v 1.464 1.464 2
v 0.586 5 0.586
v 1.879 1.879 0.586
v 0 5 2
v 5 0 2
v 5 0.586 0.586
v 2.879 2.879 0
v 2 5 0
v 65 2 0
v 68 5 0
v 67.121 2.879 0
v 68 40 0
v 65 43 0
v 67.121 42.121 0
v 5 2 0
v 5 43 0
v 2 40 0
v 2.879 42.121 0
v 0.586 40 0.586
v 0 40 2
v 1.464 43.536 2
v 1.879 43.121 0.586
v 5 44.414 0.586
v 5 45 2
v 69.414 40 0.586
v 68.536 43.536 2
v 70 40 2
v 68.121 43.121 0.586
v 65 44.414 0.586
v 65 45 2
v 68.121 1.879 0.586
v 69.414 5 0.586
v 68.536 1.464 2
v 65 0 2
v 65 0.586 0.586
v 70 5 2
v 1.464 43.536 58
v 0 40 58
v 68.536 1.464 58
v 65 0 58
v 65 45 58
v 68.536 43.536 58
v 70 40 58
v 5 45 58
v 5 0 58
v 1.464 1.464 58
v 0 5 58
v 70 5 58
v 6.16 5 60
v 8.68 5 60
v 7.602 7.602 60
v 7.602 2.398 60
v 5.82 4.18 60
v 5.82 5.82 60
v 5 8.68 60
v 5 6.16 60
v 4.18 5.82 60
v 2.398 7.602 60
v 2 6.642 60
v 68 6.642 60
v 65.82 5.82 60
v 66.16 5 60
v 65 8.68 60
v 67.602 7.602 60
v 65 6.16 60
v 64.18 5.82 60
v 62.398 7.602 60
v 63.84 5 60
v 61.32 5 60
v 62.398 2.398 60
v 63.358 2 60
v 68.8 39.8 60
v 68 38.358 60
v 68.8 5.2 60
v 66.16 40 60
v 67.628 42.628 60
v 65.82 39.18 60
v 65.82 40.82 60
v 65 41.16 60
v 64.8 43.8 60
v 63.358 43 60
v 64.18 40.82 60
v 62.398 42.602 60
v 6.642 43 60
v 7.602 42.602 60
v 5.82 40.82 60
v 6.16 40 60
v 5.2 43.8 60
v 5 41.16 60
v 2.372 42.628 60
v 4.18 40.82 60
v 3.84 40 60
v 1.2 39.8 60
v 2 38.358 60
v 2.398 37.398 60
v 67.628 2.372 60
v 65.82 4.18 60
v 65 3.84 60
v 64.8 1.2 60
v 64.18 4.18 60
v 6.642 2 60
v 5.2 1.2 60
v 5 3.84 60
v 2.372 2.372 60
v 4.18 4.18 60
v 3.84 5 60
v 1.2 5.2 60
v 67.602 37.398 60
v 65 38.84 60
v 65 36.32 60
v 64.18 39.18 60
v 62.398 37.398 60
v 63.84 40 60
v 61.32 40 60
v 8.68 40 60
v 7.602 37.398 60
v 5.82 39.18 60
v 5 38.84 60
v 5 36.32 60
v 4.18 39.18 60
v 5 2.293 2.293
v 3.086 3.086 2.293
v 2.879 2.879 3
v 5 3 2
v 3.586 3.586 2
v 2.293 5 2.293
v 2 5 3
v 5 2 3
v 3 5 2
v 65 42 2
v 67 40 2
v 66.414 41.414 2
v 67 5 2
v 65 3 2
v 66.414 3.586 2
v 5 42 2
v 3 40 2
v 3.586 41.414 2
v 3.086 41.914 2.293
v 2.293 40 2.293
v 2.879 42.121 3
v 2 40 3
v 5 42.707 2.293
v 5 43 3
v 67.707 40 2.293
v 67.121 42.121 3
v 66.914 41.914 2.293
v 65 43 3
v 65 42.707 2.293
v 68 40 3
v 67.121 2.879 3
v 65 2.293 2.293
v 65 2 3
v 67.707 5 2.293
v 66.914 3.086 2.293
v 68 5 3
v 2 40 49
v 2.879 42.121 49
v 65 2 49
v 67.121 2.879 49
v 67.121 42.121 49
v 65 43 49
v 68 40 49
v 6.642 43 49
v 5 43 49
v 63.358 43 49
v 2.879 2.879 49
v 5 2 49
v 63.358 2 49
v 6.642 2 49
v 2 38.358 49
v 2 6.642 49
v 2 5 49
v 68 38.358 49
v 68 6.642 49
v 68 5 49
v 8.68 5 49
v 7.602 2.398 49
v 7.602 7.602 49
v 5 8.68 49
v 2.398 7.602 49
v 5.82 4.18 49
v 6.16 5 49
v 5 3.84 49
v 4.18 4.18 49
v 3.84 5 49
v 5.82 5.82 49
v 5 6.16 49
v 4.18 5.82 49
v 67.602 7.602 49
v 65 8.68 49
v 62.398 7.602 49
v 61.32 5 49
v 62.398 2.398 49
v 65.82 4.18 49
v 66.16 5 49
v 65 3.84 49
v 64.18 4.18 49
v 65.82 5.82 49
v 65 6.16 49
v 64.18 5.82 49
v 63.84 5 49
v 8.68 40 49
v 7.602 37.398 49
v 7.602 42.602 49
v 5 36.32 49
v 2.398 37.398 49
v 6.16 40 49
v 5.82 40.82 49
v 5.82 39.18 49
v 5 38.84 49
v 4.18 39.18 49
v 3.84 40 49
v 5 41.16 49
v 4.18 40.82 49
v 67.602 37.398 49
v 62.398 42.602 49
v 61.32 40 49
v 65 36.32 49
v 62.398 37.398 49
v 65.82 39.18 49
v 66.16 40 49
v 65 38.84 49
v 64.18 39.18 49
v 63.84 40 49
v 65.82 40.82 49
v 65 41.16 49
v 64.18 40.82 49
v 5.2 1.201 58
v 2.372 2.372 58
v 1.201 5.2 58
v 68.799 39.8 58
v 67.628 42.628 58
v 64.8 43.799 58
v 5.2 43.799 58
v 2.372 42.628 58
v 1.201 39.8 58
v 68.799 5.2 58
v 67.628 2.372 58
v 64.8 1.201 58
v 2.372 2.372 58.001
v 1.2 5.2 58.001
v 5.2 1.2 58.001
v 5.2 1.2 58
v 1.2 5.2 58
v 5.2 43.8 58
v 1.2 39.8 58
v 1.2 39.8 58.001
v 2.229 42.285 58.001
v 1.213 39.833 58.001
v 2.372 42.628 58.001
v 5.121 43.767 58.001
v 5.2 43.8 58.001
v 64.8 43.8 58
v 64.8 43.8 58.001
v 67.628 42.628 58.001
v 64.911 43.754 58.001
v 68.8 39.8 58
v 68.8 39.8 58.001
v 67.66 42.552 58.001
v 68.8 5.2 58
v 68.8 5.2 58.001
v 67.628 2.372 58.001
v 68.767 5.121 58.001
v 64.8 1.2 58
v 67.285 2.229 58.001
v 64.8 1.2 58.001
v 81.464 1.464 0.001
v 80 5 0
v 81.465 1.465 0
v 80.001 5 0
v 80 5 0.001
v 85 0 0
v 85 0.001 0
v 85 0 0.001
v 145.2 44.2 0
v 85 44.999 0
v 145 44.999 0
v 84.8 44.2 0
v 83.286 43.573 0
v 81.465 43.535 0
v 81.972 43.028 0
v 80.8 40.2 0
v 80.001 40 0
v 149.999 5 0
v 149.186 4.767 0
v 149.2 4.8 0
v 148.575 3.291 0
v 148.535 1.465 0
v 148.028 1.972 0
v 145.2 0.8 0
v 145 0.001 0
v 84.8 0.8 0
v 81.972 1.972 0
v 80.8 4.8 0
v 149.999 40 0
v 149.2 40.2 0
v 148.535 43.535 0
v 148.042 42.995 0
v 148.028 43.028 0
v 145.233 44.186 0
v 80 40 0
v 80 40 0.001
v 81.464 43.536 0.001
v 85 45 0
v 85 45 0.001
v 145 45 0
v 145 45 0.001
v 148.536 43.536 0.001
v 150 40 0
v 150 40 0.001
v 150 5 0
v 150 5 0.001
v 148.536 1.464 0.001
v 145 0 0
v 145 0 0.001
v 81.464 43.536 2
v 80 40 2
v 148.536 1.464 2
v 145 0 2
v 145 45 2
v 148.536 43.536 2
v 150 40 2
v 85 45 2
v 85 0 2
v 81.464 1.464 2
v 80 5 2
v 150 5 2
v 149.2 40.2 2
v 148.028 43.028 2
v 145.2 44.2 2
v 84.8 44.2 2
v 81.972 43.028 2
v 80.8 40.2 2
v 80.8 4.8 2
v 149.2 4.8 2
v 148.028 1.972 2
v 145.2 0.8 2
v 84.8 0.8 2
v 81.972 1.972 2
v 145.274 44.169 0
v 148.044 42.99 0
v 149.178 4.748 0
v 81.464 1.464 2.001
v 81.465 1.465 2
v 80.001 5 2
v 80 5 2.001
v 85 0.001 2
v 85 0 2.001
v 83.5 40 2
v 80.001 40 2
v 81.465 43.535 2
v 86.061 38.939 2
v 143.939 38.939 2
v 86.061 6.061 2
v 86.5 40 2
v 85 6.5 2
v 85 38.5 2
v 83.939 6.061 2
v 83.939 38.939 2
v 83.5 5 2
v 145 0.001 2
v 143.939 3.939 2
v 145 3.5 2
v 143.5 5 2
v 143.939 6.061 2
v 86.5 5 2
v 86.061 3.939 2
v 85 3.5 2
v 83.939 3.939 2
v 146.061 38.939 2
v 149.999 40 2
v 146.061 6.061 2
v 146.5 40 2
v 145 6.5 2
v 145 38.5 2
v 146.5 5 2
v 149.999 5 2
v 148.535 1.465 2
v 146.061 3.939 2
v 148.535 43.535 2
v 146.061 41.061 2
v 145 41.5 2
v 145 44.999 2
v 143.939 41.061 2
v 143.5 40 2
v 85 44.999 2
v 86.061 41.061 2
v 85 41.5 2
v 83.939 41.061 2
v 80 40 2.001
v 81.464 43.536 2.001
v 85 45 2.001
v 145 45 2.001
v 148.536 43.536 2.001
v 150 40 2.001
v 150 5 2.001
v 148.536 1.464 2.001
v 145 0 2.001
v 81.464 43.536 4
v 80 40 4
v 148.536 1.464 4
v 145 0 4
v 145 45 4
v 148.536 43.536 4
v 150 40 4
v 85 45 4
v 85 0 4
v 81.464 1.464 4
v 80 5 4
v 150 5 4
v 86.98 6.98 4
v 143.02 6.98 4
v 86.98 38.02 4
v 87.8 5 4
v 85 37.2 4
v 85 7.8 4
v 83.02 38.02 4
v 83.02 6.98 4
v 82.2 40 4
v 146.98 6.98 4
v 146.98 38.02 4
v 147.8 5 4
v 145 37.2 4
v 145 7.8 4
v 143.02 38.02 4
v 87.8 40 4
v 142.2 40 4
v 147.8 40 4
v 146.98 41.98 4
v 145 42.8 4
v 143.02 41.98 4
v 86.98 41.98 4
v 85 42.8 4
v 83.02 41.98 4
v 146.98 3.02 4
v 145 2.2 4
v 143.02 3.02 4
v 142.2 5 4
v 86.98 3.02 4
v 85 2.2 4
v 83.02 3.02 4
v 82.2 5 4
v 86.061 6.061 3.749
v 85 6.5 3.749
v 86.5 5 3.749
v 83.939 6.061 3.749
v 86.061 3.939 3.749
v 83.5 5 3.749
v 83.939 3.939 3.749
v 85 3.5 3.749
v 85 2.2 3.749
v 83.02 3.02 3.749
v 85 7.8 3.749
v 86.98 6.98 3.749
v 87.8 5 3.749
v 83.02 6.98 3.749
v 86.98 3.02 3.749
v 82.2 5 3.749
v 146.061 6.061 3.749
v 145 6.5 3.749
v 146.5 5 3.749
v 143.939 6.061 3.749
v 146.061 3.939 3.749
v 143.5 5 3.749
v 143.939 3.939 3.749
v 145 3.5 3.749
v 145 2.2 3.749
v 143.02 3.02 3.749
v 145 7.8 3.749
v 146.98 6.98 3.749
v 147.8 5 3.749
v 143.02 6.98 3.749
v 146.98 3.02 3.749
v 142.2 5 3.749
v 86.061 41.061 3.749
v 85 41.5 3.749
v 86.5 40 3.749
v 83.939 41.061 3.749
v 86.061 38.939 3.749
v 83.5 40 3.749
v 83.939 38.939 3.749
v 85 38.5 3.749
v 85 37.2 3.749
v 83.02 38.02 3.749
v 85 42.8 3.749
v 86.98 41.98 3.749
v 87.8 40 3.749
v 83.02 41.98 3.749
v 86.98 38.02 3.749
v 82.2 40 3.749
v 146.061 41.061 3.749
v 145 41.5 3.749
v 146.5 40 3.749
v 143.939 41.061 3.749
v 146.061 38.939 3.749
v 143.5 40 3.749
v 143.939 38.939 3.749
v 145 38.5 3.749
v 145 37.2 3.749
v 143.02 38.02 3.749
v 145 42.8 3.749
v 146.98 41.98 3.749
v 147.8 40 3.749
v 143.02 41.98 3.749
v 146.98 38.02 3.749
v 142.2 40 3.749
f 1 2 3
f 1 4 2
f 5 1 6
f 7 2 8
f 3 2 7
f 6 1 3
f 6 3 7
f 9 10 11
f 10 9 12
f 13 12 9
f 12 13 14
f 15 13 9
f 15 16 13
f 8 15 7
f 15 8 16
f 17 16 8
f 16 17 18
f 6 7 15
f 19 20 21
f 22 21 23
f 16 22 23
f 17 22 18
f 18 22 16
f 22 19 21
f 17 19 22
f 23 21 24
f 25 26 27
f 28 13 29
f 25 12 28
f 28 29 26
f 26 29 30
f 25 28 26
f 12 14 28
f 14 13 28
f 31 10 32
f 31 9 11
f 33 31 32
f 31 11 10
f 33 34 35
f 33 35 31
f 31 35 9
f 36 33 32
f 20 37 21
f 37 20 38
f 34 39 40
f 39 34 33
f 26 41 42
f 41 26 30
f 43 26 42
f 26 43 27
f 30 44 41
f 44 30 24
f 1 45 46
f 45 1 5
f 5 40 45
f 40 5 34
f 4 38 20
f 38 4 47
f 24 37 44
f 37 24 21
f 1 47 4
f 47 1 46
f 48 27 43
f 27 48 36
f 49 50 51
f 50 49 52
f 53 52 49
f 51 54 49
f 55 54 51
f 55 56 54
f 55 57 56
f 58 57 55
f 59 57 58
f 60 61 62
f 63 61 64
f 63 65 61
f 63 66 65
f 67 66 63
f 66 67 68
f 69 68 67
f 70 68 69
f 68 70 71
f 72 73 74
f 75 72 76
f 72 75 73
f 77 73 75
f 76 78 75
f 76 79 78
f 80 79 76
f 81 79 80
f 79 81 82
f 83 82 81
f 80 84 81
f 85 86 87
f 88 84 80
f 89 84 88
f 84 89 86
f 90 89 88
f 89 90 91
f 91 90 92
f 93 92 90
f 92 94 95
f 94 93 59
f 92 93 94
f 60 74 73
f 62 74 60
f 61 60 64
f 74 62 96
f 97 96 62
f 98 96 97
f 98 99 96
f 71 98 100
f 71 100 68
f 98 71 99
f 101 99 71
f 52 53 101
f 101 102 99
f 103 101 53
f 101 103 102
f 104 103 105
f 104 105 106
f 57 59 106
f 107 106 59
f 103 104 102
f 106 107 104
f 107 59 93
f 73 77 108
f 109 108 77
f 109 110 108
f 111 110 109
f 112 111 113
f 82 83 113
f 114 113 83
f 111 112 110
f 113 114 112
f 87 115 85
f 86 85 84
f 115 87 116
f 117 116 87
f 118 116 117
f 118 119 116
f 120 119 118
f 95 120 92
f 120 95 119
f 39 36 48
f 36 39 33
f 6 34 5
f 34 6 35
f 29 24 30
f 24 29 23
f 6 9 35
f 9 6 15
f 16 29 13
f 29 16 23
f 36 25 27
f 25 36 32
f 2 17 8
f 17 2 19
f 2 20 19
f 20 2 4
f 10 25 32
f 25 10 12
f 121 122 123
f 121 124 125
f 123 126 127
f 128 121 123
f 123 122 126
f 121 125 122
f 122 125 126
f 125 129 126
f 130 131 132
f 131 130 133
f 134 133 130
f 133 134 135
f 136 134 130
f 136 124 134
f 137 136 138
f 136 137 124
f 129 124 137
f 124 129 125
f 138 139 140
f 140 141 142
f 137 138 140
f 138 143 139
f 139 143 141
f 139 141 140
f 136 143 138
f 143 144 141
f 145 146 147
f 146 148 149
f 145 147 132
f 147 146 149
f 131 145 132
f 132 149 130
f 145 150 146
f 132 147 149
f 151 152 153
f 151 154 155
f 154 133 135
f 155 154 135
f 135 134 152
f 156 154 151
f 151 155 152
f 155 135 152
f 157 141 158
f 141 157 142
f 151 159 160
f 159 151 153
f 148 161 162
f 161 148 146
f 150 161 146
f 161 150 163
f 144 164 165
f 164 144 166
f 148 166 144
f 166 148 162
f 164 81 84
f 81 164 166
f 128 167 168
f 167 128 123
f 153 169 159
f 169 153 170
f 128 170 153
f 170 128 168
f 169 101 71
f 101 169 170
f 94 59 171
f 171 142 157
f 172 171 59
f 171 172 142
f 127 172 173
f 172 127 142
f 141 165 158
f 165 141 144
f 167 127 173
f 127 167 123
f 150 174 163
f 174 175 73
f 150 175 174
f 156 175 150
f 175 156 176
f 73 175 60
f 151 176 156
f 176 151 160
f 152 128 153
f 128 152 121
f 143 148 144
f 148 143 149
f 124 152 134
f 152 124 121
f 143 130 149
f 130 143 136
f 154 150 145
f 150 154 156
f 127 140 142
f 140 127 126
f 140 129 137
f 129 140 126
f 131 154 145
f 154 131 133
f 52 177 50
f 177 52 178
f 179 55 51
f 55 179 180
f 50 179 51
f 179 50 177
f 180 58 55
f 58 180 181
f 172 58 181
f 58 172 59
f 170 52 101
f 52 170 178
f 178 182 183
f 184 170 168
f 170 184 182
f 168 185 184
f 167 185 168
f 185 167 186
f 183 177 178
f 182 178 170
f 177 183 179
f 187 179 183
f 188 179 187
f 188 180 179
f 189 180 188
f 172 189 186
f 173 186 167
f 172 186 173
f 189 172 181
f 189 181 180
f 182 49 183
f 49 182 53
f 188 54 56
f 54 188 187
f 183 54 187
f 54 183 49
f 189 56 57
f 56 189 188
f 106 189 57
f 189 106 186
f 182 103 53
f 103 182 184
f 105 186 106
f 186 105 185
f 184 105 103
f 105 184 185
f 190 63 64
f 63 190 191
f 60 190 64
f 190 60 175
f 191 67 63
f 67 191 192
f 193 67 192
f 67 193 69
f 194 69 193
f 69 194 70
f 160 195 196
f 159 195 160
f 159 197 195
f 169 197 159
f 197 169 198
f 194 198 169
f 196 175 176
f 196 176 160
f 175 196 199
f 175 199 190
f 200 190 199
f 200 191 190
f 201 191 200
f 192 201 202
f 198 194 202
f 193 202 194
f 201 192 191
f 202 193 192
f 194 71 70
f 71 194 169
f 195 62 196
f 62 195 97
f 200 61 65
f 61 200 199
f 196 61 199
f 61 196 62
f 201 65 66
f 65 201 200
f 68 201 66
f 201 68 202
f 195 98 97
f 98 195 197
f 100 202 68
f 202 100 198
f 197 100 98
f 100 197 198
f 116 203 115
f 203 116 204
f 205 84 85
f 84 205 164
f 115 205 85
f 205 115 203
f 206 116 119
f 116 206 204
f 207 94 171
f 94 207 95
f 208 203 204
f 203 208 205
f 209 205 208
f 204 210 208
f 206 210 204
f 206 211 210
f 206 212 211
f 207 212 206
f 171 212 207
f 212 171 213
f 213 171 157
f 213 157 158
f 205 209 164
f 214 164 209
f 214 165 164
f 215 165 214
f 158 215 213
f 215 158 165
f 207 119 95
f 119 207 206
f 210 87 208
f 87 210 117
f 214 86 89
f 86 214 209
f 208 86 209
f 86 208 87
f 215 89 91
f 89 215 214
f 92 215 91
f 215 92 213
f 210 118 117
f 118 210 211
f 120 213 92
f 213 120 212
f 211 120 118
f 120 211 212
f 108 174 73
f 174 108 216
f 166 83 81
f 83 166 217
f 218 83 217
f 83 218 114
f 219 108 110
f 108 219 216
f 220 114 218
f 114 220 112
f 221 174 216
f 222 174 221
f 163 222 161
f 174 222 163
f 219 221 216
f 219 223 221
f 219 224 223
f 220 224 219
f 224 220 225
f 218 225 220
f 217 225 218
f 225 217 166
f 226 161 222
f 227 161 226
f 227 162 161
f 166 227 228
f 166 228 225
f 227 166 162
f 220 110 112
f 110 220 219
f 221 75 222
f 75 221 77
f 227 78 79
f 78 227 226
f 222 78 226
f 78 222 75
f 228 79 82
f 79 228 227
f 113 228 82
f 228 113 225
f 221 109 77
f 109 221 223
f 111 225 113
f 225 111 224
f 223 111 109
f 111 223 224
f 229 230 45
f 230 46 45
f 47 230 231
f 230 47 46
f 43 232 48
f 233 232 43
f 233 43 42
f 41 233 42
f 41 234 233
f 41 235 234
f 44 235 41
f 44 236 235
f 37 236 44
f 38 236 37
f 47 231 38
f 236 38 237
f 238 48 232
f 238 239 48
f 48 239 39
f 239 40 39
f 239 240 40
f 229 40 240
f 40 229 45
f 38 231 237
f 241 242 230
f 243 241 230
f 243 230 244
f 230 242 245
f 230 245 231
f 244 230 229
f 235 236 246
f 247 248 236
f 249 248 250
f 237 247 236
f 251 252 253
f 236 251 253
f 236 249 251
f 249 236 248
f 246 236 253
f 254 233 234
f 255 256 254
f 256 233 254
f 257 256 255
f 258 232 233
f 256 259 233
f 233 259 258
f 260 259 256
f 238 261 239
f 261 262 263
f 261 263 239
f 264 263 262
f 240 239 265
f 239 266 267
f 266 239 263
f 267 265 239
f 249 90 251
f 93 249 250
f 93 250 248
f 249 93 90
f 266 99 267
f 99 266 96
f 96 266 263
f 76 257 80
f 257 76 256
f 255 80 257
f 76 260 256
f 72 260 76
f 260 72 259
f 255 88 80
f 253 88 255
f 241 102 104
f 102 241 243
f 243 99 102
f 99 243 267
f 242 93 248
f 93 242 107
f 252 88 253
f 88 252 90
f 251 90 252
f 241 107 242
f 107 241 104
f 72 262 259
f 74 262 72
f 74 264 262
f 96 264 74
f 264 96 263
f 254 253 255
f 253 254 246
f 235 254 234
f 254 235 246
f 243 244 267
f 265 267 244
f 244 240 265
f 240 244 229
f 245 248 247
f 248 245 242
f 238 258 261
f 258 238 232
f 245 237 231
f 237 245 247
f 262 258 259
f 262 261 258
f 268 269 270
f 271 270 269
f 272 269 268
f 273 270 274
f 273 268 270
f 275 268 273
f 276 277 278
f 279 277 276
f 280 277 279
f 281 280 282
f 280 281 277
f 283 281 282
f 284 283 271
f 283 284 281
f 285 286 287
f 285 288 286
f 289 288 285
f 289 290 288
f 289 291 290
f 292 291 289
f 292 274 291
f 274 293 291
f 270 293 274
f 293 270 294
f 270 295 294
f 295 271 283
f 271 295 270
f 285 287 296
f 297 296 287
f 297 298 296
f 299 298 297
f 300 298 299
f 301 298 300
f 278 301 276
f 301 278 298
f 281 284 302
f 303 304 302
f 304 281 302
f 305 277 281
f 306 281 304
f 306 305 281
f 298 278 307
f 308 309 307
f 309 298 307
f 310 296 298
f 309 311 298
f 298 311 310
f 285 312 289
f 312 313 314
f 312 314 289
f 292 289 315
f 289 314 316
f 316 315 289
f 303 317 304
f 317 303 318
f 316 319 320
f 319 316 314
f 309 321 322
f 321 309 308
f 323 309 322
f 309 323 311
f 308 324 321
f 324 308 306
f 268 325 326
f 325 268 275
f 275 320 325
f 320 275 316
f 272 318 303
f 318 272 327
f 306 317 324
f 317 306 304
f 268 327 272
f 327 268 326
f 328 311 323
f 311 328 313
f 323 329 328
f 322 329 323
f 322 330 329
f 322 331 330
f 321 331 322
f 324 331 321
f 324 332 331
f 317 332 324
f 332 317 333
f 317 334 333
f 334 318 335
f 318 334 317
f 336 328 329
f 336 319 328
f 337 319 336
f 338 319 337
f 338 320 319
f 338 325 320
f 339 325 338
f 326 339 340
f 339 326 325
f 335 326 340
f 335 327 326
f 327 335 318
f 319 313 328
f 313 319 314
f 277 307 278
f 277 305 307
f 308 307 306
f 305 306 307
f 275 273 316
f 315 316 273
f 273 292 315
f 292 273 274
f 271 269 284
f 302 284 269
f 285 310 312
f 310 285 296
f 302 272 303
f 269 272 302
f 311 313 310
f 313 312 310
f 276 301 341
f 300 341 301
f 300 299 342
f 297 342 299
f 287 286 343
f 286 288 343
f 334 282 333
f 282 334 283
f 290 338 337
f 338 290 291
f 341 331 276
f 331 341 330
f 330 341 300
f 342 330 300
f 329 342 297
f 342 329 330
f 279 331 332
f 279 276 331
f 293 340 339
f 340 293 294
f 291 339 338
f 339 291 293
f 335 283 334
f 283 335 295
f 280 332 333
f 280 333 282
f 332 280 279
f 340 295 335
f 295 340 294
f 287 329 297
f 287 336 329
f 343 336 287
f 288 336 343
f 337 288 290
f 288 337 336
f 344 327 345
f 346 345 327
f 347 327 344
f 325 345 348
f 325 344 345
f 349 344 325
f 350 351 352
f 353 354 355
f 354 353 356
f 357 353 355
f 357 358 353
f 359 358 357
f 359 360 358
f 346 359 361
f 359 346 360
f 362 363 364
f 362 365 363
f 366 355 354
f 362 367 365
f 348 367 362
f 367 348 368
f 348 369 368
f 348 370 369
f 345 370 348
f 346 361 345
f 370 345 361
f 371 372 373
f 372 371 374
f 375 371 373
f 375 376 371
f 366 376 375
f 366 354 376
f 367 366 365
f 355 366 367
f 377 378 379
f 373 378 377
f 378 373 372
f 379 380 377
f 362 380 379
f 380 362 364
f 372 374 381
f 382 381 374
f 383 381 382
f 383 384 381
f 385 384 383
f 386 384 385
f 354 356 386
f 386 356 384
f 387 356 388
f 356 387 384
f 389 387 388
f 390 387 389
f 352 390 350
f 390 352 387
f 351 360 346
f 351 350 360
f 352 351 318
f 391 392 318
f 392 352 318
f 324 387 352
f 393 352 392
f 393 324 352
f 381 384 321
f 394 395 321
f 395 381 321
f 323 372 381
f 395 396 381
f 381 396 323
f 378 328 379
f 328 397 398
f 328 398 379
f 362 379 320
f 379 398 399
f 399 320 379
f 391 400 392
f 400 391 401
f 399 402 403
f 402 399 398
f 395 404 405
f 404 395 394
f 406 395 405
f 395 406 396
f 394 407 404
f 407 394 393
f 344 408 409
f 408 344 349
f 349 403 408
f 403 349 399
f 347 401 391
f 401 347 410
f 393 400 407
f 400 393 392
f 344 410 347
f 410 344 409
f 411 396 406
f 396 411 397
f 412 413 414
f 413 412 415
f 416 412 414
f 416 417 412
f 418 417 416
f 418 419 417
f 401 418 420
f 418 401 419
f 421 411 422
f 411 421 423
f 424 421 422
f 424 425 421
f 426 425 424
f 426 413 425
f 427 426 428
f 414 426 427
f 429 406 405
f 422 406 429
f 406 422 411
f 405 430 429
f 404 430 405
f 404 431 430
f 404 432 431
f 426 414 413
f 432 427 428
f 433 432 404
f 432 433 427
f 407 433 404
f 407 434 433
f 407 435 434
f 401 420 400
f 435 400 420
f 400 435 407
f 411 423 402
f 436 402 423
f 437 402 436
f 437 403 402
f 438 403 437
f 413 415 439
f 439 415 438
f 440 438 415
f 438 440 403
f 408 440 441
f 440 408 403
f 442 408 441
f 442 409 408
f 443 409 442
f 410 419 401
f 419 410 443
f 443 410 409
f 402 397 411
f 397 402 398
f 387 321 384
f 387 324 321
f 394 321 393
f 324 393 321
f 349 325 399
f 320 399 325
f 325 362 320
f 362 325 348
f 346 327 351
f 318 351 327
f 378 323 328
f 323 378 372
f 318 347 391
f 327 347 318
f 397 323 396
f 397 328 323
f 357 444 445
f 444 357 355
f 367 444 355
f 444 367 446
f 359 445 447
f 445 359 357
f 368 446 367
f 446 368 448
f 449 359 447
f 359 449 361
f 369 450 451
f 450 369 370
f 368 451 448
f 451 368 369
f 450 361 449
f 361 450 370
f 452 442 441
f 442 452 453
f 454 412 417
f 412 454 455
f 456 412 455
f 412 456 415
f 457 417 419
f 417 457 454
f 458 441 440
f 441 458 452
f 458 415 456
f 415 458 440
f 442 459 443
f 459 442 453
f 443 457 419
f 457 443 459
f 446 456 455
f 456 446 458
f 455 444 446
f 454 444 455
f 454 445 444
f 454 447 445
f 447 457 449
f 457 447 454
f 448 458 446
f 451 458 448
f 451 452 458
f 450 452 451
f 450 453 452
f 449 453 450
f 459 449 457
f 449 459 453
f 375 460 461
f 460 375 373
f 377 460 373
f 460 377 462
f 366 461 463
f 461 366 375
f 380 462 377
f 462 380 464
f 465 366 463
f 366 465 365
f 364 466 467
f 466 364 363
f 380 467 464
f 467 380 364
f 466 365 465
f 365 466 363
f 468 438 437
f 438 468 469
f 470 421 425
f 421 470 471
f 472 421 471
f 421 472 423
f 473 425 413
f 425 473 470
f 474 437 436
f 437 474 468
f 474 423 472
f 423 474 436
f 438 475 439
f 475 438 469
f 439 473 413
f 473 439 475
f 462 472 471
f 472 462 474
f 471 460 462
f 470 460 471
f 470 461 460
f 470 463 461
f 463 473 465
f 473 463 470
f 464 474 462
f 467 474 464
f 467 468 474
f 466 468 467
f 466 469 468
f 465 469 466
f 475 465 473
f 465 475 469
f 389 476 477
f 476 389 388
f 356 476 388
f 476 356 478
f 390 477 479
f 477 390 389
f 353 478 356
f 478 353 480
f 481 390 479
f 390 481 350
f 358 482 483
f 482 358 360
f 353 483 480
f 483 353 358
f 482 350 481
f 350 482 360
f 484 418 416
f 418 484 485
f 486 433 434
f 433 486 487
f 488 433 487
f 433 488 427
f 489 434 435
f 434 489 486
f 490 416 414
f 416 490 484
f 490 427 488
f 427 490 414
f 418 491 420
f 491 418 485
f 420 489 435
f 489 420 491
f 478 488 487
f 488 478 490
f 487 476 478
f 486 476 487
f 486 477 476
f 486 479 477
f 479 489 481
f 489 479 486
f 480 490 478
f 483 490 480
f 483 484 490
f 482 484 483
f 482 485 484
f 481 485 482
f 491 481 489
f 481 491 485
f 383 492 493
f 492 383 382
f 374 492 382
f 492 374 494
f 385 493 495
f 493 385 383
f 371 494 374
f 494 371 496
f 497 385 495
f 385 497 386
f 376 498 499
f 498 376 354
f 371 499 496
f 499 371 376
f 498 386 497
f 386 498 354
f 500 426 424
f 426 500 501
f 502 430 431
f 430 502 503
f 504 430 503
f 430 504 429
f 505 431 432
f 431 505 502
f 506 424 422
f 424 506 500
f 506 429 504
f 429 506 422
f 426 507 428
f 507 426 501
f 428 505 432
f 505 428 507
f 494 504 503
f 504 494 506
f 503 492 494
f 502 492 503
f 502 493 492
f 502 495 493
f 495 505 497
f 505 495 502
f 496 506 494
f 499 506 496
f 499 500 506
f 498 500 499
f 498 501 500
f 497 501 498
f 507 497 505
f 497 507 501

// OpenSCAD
/*
--------------------------------------------------------------------------------
 Project: case
 from Thiemo Schuff (http://schuff.eu)
 cc-by-nc-sa 4.0: https://creativecommons.org
 12. Mar. 2023
 
 find more on:
 - https://www.printables.com/de/social/335893-starwhooper/models
 - https://www.thingiverse.com/starwhooper/designs
--------------------------------------------------------------------------------
*/

/*
----------parameters------------------------------------------------------------
*/

/*[Hidden]*/
/*[Screw DIN 7981, DIN-ISO 7049]*/
//outer thread diameter
screw_d=2.9;//[2.9,3.9] 
//head diameter
screw_dk=5.6;//[5.6,7.5]
//lenght
screw_l=13;//[13,16]


/*[Quality]*/
//roundness of circle
$fn=8;//[3,5,8,13,21,34,55,89,144,233]
//quality_offset (additional offset, for better results in preview 
qo=0.001;

/*[objects]*/
//show body
o_body=true;
//show cover
o_cover=true;
//add custom code to cover (need to show cover)
o_cover_custom=false;
/*[measurtements]*/
//x lenght
case_x=70;
//y lenght
case_y=45;
//z lenght
case_z=60;
//outer radius of case corner
case_r=5;
//outer radius of case bottom corner
case_br=2;
//wall size
case_w=2;

/*
----------modules-&-functions---------------------------------------------------
*/

module cube_rcr(x,y,z,r,br=0.001){
    translate([r,r,br])linear_extrude(z-br)offset(r)square([x-r*2,y-r*2]);
    for (i=[[r,r,br],[r,y-r,br],[x-r,y-r,br],[x-r,r,br]])
        translate(i){
            rotate_extrude(){
                translate([0,-br])square([r-br,br*2]);
                translate([r-br, 0, 0]) circle(r = br);
            }
        }
    translate([r,br,br])rotate([0,90,0])linear_extrude(x-r-r){
        translate([-br,0])square([br+br,y-br-br]);
        translate([0, y-br-br, 0])circle(r = br);
        circle(r = br);
    }
    translate([x-br,r,br])rotate([0,90,90])linear_extrude(y-r-r){
        translate([-br,0])square([br+br,x-br-br]);
        translate([0, x-br-br, 0])circle(r = br);
        circle(r = br);
    }
};

module screwhole(){
    difference(){
        cylinder(h=screw_l-case_w,r=case_r-case_w*0.66);
        cylinder(h=screw_l-case_w+qo,r=screw_d/2*0.8);
    };
};

module print_body(){
    difference(){
        union(){
            difference(){
                cube_rcr(case_x,case_y,case_z,case_r,case_br);
                translate([case_w,case_w,case_w])
                    cube_rcr(case_x-2*case_w,case_y-2*case_w,case_z-case_w+qo,case_r-case_w,1);
            };
            if ((case_x >=case_r*3) && (case_y >= case_r*3)){
                for (p=[[case_r,case_r,case_z-screw_l+case_w],[case_x-case_r,case_r,case_z-screw_l+case_w],[case_r,case_y-case_r,case_z-screw_l+case_w],[case_x-case_r,case_y-case_r,case_z-screw_l+case_w]]) 
                translate(p) screwhole();
            }
            else if ((case_x >=case_r*3) && (case_y < case_r*3)){
                for (p=[[case_r,case_y/2,case_z-screw_l+case_w],[case_x-case_r,case_y/2,case_z-screw_l+case_w]]) 
                    translate(p) screwhole();
            }
            else if ((case_x <case_r*3) && (case_y >= case_r*3)){
                for (p=[[case_x/2,case_r,case_z-screw_l+case_w],[case_x/2,case_y-case_r,case_z-screw_l+case_w]]) 
                    translate(p) screwhole();
            }
            else if ((case_x <case_r*3) && (case_y < case_r*3)){
            };
        };
        difference(){
            translate([-1,-1,case_z-case_w])
                cube_rcr(case_x+2,case_y+2,case_w+qo,case_r);    
            translate([case_w*0.6,case_w*0.6,case_z-case_w])
                cube_rcr(case_x-case_w*1.2,case_y-case_w*1.2,case_w,case_r*0.8);    
        };
    };
};

module print_cover(){
    difference(){
        cube_rcr(case_x,case_y,case_w,case_r);    
        translate([case_w*0.4,case_w*0.4,-qo])
        cube_rcr(case_x-case_w*0.8,case_y-case_w*0.8,case_w+2*qo,case_r*0.8);    
    };
    translate([0,0,case_w]){
        difference(){
            cube_rcr(case_x,case_y,case_w,case_r);    
            union(){
                if ((case_x >=case_r*3) && (case_y >= case_r*3)){
                    translate([0,0,-qo]){
                        for (p=[[case_r,case_r,0],[case_x-case_r,case_r,0],[case_r,case_y-case_r,0],[case_x-case_r,case_y-case_r,0]]) 
                        screw_hole_with_countersink(p);
                };
                }
                else if ((case_x >=case_r*3) && (case_y < case_r*3)){
                    for (p=[[case_r,case_y/2,0],[case_x-case_r,case_y/2,0]]) 
                    screw_hole_with_countersink(p);
                }
                else if ((case_x <case_r*3) && (case_y >= case_r*3)){
                    for (p=[[case_x/2,case_r,0],[case_x/2,case_y-case_r,0]]) 
                    screw_hole_with_countersink(p);
                }
                else if ((case_x <case_r*3) && (case_y < case_r*3)){
                };

                if (o_cover_custom){
        /*begin of custom holes in cover (view from upper side)*/
                    translate([case_y/2,case_y/2,0]) cylinder(h=case_z,d=28.5);    
                    translate([50,12,0]) cylinder(h=case_z,d=12);    
                    translate([50,case_y-12,0]) cylinder(h=case_z,d=12);    
        /*end of custom holes in cover (view from upper side)*/
                };
            };
        };
    };
};

module screw_hole_with_countersink(p){
    translate(p) cylinder(h=case_w,d=ceil(screw_d));
    translate([p[0],p[1],case_w-0.25]) cylinder(h=case_w,d=screw_dk);
};    


/*
----------code------------------------------------------------------------------
*/

if ((o_body)&&(o_cover)) {
    print_body();
    translate([case_x + 10,0,0]) print_cover();
}
else if (o_body)      {print_body();}
else if (o_cover)      {print_cover();};
